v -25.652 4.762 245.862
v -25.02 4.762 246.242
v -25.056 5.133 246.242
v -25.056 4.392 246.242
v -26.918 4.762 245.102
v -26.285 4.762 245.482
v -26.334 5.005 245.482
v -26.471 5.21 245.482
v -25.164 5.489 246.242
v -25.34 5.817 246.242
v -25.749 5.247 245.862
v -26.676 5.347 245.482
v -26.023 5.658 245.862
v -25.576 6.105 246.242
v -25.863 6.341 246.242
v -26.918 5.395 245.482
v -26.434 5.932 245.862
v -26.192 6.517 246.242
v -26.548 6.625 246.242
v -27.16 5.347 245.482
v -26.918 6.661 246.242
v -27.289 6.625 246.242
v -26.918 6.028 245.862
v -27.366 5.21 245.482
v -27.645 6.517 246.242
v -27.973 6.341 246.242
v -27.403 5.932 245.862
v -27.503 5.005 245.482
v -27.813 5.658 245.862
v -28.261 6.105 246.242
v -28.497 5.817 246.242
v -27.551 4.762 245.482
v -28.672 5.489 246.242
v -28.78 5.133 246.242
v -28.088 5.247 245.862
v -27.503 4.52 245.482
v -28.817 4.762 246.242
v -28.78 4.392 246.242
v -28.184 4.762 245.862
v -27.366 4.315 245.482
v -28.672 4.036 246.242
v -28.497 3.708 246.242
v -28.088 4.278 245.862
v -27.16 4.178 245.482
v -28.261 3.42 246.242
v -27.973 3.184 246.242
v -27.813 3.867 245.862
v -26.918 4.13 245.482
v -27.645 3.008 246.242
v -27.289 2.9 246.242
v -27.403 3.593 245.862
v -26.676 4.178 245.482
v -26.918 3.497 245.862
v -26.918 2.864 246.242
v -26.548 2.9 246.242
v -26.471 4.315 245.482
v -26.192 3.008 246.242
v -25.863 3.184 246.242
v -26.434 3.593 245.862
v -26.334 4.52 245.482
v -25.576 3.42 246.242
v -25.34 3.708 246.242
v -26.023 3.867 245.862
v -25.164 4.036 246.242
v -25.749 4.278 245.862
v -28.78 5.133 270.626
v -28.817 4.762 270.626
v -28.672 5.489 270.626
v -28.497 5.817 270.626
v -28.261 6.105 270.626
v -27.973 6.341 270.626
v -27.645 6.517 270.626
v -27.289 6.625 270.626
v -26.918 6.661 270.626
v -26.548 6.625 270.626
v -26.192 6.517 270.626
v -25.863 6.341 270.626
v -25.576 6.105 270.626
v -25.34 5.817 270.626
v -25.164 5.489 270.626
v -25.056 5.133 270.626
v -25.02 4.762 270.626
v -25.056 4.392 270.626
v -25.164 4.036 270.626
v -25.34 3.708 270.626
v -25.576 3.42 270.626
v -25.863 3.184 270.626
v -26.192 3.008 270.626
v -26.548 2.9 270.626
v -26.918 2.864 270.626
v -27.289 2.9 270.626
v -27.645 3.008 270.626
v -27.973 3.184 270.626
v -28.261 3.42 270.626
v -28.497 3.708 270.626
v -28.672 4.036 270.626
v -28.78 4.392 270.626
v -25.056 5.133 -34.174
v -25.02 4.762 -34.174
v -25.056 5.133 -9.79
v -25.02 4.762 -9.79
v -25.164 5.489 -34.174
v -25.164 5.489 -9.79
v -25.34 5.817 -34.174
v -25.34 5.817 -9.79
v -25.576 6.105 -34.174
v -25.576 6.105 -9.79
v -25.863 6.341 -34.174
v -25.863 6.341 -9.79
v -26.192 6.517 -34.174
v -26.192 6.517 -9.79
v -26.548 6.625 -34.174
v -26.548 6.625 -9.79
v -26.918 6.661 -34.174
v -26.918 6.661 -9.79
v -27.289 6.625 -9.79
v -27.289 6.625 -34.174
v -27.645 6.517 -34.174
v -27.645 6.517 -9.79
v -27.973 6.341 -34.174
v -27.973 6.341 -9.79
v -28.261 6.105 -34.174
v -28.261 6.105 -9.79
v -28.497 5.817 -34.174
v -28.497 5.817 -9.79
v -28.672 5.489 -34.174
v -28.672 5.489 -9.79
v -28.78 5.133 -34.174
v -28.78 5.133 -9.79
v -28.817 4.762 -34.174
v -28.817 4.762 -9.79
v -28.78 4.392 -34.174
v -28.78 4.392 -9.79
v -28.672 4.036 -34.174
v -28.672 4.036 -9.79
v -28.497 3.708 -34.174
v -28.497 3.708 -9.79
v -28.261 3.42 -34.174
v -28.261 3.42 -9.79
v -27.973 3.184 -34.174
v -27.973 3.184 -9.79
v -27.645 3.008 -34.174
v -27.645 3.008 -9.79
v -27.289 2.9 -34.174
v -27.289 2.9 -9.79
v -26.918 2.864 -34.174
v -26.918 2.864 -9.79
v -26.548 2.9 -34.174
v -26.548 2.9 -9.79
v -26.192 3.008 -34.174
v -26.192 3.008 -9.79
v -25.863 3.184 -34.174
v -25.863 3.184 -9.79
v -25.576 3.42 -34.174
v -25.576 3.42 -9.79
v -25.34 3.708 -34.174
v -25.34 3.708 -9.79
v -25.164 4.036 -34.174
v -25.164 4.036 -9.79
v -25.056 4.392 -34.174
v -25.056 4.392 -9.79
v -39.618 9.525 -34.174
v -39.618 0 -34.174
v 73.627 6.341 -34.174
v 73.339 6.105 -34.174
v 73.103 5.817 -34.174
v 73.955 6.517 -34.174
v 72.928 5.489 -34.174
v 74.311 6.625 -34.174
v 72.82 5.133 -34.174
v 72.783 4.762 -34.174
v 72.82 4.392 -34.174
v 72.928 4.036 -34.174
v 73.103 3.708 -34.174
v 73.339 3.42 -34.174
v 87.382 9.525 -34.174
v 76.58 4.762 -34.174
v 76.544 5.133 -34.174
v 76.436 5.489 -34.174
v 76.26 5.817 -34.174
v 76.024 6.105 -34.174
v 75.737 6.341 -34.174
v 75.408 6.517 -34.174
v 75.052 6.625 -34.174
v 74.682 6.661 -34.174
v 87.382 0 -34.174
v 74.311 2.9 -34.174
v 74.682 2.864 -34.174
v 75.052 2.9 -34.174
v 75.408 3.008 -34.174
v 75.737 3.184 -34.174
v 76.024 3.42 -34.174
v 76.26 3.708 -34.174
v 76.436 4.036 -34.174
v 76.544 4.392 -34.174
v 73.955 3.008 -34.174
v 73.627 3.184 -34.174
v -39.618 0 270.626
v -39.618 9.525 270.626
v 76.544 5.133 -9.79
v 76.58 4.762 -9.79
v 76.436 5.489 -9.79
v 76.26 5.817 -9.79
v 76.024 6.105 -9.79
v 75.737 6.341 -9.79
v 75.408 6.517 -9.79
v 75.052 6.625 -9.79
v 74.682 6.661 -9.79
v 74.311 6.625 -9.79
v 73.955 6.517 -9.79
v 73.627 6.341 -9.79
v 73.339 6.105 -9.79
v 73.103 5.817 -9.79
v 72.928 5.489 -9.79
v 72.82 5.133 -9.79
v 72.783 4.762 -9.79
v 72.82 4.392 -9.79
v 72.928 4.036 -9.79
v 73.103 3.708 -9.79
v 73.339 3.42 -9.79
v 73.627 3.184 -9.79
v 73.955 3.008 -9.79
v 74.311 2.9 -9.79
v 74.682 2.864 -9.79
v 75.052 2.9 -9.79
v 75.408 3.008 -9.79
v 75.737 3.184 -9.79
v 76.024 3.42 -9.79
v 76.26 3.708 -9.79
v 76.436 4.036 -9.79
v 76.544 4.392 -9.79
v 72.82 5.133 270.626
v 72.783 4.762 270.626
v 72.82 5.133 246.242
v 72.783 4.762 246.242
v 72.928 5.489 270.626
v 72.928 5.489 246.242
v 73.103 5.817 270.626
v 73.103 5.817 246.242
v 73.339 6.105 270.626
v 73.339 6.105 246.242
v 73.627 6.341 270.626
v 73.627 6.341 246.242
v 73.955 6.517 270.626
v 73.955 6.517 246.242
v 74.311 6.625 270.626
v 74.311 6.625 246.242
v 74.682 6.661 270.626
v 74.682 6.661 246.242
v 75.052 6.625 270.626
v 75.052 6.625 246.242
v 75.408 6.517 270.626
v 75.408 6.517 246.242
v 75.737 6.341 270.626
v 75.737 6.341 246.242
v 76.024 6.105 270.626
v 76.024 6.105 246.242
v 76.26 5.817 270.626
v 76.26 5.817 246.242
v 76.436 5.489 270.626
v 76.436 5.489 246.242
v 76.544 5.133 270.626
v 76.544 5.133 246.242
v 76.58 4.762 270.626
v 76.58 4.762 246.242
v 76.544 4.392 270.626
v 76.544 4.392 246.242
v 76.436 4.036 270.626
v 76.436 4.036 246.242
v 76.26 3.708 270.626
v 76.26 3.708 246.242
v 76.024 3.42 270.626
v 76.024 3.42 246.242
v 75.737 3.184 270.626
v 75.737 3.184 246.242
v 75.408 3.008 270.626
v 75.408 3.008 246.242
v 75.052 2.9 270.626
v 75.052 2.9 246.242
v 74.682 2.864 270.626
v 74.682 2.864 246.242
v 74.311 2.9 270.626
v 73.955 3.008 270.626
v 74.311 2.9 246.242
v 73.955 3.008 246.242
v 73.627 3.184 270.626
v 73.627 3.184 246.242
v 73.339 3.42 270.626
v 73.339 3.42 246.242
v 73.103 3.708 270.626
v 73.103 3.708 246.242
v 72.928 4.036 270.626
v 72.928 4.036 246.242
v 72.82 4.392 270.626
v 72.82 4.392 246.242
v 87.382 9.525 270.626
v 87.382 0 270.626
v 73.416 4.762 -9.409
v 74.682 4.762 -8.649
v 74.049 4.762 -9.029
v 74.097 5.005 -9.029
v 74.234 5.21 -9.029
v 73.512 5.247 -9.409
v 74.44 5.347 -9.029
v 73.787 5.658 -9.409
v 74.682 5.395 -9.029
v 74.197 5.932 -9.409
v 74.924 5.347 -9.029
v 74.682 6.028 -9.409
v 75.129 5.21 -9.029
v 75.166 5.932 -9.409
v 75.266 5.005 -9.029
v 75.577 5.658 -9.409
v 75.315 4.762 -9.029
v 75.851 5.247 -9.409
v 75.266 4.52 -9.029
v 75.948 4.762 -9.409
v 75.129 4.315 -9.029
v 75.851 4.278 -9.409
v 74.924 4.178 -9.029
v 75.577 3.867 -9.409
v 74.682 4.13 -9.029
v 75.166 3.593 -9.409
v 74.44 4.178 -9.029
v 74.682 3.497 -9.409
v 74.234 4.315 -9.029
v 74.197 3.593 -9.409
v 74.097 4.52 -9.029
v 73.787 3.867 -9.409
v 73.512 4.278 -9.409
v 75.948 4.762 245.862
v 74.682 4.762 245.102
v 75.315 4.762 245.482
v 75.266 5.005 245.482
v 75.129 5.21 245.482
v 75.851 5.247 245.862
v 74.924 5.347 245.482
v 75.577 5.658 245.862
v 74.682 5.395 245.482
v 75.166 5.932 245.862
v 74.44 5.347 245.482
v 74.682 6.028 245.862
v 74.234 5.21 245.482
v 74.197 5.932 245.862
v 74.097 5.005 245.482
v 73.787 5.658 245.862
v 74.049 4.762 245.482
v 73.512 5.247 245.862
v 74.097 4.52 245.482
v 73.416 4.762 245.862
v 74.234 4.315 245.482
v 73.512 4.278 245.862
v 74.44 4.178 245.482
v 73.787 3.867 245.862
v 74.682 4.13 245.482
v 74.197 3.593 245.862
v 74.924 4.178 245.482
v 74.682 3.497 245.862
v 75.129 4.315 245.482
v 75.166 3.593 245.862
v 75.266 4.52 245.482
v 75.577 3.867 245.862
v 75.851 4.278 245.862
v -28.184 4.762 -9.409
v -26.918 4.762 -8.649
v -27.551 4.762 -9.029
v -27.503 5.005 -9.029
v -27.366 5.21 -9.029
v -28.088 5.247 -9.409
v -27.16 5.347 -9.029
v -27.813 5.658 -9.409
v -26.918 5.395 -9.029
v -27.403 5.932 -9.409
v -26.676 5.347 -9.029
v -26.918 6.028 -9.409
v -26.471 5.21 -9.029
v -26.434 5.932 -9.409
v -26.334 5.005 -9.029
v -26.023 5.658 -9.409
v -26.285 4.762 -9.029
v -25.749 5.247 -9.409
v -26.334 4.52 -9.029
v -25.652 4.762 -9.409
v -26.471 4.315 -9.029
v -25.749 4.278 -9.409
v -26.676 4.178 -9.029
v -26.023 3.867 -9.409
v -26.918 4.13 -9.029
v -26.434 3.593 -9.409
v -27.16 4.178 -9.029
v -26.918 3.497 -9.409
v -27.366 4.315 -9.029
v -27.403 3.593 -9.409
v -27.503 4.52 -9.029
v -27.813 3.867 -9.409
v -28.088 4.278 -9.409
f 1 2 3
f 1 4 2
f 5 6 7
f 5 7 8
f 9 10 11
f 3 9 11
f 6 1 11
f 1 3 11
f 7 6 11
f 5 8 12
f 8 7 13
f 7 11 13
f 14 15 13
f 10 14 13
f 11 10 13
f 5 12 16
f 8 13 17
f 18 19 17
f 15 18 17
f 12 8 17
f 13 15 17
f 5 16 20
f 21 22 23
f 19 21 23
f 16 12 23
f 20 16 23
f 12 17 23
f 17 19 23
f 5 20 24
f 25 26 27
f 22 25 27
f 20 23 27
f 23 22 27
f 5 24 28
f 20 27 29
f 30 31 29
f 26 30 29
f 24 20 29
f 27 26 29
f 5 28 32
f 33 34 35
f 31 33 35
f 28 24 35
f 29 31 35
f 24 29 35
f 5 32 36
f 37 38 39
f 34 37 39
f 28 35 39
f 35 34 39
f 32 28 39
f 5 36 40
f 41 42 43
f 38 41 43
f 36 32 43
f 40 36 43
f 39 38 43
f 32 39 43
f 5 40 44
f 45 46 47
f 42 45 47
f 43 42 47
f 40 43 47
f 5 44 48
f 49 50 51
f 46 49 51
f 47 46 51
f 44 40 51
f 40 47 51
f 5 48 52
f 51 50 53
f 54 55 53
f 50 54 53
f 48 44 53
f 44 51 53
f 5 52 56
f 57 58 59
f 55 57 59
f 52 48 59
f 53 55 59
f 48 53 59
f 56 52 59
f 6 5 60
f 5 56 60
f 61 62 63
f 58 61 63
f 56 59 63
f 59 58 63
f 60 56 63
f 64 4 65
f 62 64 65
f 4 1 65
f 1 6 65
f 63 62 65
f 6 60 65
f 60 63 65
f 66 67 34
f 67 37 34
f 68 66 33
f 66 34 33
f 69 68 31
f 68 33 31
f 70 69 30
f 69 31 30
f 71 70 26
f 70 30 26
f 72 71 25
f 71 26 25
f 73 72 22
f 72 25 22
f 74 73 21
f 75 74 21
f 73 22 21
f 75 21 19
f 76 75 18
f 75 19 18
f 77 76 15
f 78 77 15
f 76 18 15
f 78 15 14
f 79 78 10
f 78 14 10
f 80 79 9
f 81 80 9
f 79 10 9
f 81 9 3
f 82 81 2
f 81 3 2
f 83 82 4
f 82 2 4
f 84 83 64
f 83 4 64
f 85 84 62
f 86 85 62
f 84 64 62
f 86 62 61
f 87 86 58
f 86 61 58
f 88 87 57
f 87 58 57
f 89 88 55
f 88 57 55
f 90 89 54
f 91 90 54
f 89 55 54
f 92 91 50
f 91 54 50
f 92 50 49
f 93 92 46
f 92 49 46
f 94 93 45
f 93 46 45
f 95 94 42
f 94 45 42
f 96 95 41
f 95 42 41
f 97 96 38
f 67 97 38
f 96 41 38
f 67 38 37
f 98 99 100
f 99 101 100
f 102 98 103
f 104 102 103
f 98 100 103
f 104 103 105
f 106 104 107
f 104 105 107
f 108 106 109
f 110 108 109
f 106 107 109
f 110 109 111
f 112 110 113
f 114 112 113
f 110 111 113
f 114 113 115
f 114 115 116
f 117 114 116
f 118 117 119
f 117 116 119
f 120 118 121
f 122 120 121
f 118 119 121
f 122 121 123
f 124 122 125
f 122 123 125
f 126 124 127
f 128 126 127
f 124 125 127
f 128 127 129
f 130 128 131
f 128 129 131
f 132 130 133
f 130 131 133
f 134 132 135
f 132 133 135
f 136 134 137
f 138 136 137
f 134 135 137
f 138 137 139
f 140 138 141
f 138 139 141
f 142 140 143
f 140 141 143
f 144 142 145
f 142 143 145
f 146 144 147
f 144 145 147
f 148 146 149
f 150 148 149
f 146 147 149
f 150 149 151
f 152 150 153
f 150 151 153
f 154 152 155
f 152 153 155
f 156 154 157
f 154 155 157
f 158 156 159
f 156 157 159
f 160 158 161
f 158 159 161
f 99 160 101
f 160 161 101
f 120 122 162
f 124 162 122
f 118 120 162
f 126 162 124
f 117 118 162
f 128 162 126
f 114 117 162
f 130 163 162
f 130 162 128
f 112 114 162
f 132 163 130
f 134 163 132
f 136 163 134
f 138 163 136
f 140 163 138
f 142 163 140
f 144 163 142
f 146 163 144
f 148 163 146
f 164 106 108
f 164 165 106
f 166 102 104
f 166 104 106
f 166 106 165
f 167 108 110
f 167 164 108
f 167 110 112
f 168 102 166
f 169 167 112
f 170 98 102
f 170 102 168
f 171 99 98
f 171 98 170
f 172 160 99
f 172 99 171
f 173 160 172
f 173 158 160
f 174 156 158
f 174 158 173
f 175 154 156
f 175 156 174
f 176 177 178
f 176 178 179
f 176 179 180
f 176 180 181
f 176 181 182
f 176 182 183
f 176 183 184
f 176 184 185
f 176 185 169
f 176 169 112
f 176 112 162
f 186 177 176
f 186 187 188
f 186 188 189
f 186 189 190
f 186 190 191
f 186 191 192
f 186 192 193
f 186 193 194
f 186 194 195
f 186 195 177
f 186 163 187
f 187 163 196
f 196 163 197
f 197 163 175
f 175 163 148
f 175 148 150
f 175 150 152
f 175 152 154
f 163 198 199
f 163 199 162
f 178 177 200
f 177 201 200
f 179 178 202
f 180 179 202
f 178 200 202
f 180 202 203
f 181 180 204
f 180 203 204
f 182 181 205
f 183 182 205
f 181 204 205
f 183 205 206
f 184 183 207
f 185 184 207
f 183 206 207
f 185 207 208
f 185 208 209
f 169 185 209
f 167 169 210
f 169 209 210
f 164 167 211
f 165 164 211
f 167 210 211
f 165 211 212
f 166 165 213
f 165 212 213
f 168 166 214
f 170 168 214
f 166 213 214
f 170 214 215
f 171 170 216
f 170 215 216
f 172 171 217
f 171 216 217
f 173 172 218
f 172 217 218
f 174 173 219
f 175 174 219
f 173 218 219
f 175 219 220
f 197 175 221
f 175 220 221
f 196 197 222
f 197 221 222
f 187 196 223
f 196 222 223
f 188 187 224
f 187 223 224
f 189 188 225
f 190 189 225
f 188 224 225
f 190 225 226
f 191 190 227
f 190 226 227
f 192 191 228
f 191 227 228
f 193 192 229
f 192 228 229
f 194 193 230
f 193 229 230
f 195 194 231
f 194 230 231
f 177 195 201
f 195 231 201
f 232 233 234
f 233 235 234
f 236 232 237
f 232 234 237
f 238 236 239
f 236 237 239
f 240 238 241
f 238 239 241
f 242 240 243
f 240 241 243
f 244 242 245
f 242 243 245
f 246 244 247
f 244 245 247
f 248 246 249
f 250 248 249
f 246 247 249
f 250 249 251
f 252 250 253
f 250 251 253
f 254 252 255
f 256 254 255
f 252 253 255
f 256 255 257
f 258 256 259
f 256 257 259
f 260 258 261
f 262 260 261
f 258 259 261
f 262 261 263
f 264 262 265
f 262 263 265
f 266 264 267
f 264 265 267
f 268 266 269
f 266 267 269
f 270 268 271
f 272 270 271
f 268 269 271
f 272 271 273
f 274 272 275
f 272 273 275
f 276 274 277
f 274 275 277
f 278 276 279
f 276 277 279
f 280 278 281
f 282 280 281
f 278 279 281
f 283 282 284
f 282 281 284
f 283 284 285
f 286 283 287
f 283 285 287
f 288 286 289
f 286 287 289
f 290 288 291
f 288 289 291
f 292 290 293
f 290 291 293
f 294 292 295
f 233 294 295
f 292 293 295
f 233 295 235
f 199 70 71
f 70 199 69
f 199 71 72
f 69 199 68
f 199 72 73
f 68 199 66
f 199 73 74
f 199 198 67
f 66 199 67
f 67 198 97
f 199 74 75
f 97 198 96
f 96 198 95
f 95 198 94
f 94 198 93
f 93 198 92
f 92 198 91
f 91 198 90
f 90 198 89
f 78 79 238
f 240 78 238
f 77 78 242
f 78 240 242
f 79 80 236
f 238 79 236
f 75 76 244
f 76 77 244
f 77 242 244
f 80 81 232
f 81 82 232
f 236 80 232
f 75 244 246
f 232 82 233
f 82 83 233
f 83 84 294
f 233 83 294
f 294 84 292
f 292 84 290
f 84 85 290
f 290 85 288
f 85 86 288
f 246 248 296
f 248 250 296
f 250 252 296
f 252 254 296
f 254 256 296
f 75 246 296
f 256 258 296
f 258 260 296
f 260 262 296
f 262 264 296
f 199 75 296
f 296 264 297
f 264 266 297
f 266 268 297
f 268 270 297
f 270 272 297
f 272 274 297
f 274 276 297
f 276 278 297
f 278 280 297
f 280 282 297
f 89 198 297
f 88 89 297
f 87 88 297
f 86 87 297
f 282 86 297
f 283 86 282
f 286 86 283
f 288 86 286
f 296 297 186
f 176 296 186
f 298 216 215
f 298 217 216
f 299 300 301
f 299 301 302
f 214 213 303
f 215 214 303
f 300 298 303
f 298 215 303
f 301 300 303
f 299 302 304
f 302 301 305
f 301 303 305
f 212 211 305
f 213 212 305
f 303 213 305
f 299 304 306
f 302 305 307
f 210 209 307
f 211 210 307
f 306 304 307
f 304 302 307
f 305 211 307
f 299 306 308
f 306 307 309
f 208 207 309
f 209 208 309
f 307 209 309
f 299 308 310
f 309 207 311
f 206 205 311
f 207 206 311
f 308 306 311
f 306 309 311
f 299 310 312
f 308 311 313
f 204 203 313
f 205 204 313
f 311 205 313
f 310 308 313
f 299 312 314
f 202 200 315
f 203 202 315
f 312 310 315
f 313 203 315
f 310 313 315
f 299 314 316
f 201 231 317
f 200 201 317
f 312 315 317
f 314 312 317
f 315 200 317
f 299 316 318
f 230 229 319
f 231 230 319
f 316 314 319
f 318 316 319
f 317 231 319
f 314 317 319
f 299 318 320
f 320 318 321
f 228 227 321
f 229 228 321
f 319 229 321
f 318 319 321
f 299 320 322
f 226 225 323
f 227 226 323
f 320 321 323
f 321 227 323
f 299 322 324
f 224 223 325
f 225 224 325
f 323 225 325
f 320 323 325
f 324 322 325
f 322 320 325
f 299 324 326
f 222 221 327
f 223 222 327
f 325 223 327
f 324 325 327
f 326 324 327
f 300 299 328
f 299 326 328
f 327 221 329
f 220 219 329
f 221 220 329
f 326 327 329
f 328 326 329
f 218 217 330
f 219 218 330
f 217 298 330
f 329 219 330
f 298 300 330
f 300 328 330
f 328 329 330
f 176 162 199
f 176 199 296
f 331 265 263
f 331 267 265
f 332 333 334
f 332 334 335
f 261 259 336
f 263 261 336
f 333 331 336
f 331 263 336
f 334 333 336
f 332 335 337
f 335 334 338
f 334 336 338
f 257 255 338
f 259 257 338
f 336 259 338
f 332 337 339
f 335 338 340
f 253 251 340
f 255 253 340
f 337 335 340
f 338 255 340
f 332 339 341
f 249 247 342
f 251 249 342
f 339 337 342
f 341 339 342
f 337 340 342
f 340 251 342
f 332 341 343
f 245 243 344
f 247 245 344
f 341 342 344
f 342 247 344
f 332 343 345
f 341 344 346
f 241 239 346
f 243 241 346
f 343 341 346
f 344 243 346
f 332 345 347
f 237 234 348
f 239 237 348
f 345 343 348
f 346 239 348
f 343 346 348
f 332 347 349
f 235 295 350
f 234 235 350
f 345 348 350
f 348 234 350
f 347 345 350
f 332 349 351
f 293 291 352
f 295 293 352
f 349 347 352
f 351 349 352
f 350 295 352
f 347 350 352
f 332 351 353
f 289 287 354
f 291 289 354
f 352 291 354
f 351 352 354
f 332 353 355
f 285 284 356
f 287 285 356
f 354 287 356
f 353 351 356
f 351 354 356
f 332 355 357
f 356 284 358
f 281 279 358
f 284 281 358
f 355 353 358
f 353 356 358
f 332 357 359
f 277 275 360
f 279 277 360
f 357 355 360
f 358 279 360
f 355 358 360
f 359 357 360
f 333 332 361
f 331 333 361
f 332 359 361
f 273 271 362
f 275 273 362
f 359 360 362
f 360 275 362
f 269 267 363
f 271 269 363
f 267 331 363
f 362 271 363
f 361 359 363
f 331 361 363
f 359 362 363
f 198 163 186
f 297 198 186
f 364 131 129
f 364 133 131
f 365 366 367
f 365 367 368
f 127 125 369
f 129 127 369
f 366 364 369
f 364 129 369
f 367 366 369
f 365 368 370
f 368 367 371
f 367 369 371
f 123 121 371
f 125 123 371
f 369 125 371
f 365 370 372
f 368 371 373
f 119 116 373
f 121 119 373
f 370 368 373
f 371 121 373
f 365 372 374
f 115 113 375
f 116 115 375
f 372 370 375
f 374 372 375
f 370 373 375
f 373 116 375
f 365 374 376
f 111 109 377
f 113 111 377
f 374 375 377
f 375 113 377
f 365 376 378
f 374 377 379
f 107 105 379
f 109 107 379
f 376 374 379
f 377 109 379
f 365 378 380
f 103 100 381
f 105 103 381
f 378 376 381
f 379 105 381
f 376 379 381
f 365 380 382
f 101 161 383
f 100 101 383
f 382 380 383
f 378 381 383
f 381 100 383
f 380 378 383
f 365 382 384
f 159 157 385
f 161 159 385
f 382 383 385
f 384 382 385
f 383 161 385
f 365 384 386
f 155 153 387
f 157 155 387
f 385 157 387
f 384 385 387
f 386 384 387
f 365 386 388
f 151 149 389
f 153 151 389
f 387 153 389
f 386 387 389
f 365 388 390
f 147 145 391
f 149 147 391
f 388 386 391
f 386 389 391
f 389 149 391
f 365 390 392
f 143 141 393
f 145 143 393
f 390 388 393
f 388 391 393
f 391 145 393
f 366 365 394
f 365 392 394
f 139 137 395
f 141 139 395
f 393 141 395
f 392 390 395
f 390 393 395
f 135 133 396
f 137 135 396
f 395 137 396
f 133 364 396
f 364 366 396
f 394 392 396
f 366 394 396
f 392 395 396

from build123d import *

# Parameters (mm, degrees)
SKETCH1_W                  = 127
SKETCH1_H                  = 304.8
BOSS_EXTRUDE1_DEPTH        = 9.525
F_10_24_TAPPED_HOLE1_D     = 3.7973
F_10_24_TAPPED_HOLE1_DEPTH = 24.384
F_10_24_TAPPED_HOLE1_TIP   = 1.140824014
F_10_24_TAPPED_HOLE2_D     = 3.7973
F_10_24_TAPPED_HOLE2_DEPTH = 24.384
F_10_24_TAPPED_HOLE2_TIP   = 1.140824014


with BuildPart() as part:
    # Sketch1 → Boss-Extrude1 (new body)
    with BuildSketch(Plane(origin=(0, 0, 0), x_dir=(1, 0, 0), z_dir=(0, 1, 0))):
        with Locations((23.881772484, -118.226382698)):
            Rectangle(SKETCH1_W, SKETCH1_H)
    extrude(amount=BOSS_EXTRUDE1_DEPTH)

    # #10-24 Tapped Hole1
    with Locations(Plane.XY.offset(270.626382698)):
        with Locations((-26.918227516, 4.7625), (74.681772484, 4.7625)):
            Hole(F_10_24_TAPPED_HOLE1_D / 2, depth=F_10_24_TAPPED_HOLE1_DEPTH)
            with Locations((0, 0, -(F_10_24_TAPPED_HOLE1_DEPTH + F_10_24_TAPPED_HOLE1_TIP / 2))):  # 118° drill point
                Cone(0, F_10_24_TAPPED_HOLE1_D / 2, F_10_24_TAPPED_HOLE1_TIP, mode=Mode.SUBTRACT)

    # #10-24 Tapped Hole2
    with Locations(Plane(origin=(0, 0, -34.173617302), x_dir=(-1, 0, 0), z_dir=(0, 0, -1))):
        with Locations((-74.681772484, 4.7625), (26.918227516, 4.7625)):
            Hole(F_10_24_TAPPED_HOLE2_D / 2, depth=F_10_24_TAPPED_HOLE2_DEPTH)
            with Locations((0, 0, -(F_10_24_TAPPED_HOLE2_DEPTH + F_10_24_TAPPED_HOLE2_TIP / 2))):  # 118° drill point
                Cone(0, F_10_24_TAPPED_HOLE2_D / 2, F_10_24_TAPPED_HOLE2_TIP, mode=Mode.SUBTRACT)


solid = part.part
